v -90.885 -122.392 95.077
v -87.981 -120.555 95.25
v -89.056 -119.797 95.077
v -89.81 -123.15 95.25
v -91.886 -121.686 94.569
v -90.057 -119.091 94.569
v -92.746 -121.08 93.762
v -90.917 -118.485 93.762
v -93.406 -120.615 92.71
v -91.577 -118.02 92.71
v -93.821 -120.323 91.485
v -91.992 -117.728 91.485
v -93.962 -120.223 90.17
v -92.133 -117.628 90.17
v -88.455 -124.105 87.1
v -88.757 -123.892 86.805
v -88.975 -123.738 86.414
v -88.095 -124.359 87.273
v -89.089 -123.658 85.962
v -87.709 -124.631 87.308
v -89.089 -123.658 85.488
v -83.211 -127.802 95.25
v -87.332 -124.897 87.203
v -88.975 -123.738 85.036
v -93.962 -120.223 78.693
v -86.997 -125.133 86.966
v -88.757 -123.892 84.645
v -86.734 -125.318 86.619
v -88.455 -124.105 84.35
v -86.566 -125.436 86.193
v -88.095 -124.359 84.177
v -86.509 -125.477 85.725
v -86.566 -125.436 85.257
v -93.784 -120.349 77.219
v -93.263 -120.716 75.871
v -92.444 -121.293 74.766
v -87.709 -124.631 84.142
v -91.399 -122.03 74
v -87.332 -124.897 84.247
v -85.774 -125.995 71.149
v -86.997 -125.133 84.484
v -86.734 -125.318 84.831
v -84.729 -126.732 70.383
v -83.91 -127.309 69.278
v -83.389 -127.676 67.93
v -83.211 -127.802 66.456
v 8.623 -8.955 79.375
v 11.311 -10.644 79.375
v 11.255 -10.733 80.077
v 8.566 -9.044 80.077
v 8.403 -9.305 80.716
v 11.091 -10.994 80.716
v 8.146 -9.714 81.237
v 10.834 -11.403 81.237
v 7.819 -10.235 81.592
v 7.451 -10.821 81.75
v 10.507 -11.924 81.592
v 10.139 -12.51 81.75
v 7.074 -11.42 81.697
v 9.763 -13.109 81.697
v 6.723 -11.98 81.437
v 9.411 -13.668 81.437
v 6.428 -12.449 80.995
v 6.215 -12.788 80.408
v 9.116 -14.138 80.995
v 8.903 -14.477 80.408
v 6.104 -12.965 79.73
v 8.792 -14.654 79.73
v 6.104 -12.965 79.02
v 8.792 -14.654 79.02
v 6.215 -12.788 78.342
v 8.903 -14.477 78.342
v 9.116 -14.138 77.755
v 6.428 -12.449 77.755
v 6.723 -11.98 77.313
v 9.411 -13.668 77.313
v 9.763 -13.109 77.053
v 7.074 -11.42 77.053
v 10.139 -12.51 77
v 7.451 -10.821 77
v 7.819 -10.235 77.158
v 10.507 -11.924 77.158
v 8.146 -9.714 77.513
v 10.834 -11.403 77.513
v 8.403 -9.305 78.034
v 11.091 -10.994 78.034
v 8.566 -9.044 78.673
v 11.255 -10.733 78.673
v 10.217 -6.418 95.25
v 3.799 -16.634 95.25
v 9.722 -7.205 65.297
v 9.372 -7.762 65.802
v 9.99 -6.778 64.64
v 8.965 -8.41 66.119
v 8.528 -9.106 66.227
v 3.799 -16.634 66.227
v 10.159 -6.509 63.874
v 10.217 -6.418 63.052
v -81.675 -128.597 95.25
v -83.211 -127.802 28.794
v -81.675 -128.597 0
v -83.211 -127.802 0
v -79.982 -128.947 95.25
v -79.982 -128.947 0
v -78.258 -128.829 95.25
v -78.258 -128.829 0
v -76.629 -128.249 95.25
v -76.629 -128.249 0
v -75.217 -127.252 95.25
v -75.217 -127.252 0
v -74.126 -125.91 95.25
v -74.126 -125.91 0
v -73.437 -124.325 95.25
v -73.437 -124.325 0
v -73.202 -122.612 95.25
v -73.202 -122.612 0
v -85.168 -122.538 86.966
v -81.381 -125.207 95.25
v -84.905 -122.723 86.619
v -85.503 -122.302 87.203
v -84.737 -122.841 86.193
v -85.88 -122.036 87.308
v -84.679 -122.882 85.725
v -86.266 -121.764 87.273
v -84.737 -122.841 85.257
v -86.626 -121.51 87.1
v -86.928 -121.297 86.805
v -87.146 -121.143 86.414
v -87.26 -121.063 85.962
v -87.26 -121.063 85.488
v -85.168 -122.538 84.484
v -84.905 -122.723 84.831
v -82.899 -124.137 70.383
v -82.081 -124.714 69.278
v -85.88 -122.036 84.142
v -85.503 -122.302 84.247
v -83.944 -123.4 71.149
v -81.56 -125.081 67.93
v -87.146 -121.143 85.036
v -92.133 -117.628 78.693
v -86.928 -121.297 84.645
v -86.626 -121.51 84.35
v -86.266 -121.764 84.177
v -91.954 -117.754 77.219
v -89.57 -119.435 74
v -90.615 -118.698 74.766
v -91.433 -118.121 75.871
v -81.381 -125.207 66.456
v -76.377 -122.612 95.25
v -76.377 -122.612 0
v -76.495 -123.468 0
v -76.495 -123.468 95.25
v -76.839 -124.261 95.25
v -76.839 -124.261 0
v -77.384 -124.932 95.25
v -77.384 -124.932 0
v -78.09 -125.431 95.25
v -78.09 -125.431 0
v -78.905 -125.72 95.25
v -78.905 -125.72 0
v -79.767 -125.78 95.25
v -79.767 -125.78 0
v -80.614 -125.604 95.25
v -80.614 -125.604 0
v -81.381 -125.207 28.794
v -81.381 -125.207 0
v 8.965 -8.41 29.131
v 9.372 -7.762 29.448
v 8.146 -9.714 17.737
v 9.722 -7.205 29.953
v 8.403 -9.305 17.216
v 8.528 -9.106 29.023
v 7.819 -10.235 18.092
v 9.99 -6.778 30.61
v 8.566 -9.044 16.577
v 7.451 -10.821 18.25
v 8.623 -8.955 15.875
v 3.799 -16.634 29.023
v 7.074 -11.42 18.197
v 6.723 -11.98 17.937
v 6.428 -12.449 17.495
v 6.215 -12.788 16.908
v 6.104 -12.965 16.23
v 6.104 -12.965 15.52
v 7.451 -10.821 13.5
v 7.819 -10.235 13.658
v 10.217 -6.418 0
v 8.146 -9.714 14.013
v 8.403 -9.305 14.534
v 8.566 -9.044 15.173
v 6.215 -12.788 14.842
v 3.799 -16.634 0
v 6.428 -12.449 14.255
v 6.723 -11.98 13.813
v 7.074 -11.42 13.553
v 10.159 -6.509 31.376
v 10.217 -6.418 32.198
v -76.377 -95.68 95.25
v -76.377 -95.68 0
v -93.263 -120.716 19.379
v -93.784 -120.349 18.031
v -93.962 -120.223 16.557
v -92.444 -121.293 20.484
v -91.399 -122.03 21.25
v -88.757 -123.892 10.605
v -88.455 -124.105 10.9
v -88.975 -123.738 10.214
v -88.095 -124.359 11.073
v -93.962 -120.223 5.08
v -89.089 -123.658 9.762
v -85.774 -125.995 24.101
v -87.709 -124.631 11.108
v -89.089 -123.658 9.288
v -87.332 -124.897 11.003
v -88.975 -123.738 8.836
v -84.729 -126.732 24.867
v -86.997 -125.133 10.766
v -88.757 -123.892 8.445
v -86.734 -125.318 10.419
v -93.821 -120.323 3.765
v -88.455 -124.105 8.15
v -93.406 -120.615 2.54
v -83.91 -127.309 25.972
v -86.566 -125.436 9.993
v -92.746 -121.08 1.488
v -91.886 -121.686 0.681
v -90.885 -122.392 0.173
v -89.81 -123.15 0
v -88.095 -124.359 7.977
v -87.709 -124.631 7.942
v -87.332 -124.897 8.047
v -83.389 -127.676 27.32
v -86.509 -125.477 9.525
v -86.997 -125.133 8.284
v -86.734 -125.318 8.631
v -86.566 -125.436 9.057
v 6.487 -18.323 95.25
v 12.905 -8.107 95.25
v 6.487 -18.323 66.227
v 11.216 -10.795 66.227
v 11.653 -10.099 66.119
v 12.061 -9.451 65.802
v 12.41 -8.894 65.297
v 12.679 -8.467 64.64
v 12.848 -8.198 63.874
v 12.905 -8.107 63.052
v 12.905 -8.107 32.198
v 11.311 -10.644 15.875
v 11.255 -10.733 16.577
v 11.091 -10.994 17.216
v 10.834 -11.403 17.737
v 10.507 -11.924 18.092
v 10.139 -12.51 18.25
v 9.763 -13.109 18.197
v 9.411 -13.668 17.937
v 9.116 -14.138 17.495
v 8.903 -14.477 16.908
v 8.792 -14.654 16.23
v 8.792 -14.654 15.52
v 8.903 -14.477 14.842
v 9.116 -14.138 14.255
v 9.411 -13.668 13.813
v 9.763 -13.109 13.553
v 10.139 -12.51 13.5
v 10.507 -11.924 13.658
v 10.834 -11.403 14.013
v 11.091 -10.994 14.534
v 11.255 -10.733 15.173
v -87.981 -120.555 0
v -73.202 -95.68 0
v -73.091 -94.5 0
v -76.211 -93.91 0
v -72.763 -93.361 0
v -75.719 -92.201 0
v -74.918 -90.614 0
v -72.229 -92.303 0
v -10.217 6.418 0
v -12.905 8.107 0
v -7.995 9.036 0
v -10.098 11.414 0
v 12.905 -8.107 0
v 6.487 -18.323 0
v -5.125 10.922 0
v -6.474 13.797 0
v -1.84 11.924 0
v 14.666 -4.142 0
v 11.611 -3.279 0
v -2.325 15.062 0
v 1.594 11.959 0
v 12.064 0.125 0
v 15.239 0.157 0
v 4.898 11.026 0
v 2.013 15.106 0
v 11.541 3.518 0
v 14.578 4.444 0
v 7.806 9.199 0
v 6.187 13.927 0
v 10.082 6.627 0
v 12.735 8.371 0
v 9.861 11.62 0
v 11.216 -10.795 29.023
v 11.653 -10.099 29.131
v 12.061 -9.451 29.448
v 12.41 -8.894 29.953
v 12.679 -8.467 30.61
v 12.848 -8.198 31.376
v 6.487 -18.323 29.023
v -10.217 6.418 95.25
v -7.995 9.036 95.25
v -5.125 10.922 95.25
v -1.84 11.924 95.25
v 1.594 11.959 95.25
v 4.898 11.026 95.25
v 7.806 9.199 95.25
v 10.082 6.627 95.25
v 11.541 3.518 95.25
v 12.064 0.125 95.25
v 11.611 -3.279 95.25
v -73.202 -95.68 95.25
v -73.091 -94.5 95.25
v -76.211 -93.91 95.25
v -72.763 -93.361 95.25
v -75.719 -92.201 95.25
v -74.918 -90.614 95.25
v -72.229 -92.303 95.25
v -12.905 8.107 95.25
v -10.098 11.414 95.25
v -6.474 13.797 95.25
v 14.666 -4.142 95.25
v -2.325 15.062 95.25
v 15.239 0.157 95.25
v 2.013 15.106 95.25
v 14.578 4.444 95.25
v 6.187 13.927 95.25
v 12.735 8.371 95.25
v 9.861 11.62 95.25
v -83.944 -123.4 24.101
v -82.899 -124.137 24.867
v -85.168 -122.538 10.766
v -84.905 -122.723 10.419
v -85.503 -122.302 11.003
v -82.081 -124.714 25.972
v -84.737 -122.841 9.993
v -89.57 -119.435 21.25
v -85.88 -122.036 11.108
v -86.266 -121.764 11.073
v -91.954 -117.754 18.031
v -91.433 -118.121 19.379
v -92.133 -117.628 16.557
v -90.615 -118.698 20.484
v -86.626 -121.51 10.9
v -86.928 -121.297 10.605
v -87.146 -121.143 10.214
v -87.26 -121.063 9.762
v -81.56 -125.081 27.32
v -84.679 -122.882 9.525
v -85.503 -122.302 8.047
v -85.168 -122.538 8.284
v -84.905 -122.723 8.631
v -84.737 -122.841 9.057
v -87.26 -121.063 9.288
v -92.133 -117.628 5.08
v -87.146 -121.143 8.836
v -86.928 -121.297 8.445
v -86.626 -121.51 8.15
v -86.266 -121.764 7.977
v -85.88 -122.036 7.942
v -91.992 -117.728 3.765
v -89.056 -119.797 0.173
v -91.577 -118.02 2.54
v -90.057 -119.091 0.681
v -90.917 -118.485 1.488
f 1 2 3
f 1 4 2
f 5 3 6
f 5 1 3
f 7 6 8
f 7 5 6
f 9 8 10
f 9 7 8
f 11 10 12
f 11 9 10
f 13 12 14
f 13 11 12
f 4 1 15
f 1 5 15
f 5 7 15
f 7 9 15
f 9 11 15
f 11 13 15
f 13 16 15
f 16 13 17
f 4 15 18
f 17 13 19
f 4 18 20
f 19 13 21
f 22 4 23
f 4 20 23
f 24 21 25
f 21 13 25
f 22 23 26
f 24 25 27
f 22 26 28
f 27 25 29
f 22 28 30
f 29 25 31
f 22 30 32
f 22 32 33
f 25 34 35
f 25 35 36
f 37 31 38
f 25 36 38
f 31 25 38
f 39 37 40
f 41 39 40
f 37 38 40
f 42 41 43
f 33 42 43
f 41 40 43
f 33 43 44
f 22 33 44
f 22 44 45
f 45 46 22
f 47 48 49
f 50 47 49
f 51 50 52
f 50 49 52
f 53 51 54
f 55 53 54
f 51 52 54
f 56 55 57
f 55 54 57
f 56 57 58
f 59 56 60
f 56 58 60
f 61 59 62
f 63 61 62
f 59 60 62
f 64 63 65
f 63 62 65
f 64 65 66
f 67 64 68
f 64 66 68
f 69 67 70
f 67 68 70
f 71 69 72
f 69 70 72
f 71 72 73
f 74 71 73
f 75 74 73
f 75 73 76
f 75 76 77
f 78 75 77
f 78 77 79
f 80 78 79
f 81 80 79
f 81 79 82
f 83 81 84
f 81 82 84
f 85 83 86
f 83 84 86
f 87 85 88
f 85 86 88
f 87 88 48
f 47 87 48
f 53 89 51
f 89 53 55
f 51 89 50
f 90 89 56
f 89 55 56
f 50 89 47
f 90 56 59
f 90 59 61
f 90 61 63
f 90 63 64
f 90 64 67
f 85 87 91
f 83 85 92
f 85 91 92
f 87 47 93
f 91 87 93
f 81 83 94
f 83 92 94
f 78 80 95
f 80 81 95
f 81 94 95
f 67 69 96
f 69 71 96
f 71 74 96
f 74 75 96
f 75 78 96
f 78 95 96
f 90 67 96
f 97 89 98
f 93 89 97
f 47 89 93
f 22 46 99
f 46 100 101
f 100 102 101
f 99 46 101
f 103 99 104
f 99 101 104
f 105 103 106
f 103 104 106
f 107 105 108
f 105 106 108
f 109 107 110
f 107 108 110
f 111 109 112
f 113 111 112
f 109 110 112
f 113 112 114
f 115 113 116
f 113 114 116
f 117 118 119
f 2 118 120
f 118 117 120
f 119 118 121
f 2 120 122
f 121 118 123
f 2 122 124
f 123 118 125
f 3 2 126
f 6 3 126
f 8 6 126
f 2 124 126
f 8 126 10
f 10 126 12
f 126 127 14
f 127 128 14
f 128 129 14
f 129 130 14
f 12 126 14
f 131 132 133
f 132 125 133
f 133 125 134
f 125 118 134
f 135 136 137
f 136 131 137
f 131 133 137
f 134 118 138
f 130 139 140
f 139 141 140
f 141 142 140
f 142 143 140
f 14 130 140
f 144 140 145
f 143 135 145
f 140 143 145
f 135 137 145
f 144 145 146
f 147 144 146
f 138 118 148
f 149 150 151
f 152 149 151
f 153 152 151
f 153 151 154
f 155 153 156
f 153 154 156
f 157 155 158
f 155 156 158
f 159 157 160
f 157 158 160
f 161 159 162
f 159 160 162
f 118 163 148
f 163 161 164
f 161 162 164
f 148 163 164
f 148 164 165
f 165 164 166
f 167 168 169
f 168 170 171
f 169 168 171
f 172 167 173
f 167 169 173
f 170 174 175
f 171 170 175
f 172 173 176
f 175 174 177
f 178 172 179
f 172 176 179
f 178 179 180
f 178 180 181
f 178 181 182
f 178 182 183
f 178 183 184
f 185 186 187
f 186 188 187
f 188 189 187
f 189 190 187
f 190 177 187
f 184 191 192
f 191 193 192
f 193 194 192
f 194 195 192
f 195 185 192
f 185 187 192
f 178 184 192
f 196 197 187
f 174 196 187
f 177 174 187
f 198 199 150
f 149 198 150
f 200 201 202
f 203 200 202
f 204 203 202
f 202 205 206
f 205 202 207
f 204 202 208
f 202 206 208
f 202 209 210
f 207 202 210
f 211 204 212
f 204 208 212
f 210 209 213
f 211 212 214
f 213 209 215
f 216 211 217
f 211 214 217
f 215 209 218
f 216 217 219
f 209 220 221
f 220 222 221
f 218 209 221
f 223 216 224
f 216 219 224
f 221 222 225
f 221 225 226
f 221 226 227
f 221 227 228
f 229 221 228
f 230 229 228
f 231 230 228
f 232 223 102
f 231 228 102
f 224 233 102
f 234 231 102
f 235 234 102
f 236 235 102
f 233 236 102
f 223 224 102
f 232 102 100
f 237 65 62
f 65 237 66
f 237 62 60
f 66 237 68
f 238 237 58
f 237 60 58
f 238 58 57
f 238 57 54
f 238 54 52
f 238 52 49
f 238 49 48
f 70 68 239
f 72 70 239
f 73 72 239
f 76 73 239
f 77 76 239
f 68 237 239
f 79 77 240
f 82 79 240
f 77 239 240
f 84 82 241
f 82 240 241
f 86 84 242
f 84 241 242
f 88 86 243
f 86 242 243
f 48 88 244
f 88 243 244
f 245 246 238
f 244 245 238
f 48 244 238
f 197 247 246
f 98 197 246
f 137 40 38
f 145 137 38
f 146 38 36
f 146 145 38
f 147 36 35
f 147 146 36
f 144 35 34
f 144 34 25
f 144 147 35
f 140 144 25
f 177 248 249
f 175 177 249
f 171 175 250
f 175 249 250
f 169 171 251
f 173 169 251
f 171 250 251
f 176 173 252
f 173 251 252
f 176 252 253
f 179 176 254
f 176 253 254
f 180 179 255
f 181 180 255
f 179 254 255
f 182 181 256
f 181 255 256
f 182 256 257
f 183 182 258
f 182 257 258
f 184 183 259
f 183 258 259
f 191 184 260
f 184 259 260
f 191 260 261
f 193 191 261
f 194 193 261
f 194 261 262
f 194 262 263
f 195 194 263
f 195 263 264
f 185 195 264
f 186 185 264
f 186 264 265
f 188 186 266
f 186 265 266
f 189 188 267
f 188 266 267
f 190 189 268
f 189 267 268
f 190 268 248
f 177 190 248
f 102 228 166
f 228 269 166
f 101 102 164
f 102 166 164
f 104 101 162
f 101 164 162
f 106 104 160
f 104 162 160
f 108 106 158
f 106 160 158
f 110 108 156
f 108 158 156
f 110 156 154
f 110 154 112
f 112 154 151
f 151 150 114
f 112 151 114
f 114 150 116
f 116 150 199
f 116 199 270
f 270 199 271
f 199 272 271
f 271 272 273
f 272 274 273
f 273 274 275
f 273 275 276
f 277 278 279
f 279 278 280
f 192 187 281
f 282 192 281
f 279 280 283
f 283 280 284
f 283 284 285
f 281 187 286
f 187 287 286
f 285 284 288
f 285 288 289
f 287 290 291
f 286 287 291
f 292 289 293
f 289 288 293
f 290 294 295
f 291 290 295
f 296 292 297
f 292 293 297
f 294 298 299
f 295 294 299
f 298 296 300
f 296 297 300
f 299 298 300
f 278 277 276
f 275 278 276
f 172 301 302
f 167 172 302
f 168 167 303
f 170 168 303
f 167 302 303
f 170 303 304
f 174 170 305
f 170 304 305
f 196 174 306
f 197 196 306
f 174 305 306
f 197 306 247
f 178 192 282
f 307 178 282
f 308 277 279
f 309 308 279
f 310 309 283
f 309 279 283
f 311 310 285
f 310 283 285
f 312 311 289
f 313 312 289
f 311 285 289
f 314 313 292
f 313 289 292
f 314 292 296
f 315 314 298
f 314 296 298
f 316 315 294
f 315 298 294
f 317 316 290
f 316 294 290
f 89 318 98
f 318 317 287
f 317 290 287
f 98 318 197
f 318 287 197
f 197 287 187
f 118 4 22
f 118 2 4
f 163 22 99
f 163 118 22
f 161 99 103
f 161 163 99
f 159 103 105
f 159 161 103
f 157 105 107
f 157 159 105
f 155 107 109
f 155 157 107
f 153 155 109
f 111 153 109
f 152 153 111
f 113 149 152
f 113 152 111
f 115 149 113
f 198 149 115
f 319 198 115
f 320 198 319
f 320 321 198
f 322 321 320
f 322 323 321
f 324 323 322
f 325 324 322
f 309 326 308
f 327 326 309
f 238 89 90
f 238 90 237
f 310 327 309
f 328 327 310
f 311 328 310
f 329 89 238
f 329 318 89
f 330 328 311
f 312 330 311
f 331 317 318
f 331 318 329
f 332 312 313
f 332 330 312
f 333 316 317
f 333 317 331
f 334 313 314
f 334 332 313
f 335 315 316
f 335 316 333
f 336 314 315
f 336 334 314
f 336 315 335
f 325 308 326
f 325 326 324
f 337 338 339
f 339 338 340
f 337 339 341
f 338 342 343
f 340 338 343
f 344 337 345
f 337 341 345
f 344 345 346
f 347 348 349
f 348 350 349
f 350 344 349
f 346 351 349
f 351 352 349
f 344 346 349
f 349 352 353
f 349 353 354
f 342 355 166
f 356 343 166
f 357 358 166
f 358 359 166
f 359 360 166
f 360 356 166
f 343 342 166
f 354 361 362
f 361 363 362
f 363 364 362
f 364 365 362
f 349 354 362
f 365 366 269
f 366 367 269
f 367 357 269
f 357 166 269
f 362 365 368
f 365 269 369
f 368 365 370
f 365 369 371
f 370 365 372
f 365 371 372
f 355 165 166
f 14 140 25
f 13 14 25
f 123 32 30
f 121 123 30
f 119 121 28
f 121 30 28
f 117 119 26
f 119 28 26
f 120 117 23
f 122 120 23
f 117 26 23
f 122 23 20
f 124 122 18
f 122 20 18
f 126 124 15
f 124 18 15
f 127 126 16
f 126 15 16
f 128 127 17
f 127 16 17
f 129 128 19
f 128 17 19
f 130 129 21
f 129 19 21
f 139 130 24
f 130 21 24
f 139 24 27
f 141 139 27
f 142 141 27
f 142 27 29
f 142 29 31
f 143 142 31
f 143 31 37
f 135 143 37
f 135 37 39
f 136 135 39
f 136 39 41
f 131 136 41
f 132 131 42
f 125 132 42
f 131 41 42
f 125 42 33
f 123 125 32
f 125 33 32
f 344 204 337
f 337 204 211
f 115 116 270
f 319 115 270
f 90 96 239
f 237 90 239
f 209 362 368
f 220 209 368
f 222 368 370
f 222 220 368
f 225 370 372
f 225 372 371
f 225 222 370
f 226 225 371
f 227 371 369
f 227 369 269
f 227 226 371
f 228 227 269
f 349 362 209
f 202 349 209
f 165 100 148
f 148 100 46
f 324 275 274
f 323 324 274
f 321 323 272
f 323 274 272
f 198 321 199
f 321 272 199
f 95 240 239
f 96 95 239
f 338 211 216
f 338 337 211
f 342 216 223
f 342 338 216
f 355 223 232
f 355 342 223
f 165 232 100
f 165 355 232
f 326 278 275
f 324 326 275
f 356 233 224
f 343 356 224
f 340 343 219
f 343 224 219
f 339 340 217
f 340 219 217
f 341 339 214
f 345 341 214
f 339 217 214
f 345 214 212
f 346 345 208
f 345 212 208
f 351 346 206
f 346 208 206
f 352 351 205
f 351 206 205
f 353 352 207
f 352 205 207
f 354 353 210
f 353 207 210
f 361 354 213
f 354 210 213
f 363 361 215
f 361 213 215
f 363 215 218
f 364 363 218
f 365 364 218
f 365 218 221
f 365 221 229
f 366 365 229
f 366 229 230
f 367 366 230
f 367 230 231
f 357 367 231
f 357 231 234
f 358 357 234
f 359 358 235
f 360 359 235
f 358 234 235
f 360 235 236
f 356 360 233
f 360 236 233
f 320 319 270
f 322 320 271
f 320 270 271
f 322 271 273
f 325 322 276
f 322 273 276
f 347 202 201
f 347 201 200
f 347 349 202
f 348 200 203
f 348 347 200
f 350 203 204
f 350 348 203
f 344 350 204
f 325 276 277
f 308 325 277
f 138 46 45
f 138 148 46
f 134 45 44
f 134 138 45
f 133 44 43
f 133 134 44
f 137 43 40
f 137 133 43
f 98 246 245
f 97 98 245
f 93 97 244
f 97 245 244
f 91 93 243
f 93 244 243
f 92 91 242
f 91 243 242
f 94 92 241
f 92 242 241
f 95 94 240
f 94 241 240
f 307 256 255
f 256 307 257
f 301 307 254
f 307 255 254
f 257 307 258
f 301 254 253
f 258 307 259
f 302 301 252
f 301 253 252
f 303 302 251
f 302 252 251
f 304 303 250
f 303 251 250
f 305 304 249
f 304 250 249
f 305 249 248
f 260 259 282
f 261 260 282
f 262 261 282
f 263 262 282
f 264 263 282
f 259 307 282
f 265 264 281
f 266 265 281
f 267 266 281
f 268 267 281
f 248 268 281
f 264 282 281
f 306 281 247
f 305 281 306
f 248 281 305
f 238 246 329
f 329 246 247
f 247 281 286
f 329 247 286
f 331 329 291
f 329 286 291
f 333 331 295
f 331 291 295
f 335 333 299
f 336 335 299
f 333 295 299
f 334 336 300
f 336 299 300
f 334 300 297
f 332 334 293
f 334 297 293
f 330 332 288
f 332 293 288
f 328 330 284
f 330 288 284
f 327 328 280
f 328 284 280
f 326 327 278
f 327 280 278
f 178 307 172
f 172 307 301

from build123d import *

# Parameters (mm, degrees)
F1_DEPTH = 95.25
F2_R     = 1.5875
F3_DEPTH = 3.175
F4_DEPTH = 3.175
F5_R     = 5.08
F6_R     = 2.38125
F7_DEPTH = 3.175
F9_DEPTH = 12.7


with BuildPart() as f1:
    # F0 (on Top) → F1 (new body)
    with BuildSketch(Plane.XY):
        with BuildLine():
            Line((-92.1331368885, -117.6278676055), (-93.9624351915, -120.2229191885))
            Line((-93.9624351915, -120.2229191885), (-83.2106191336, -127.802066747))
            ThreePointArc((-83.2106191336, -127.802066747), (-76.6288041341, -128.2490988663), (-73.2020225275, -122.611963581))
            Line((-73.2020225275, -122.611963581), (-73.2020225275, -95.6804940123))
            ThreePointArc((-73.2020225275, -95.6804940123), (-72.9539595945, -93.922977574), (-72.2291519666, -92.3027759964))
            Line((-72.2291519666, -92.3027759964), (-10.2165459343, 6.4176642302))
            ThreePointArc((-10.2165459343, 6.4176642302), (6.4176642302, 10.2165459343), (10.2165459343, -6.4176642302))
            Line((10.2165459343, -6.4176642302), (3.7988817041, -16.6342101646))
            Line((3.7988817041, -16.6342101646), (6.4874464236, -18.3230691725))
            Line((6.4874464236, -18.3230691725), (12.9051106539, -8.1065232382))
            ThreePointArc((12.9051106539, -8.1065232382), (8.1065232382, 12.9051106539), (-12.9051106539, 8.1065232382))
            Line((-12.9051106539, 8.1065232382), (-74.9177166862, -90.6139169884))
            ThreePointArc((-74.9177166862, -90.6139169884), (-76.004928128, -93.0442193549), (-76.3770225275, -95.6804940123))
            Line((-76.3770225275, -95.6804940123), (-76.3770225275, -122.611963581))
            ThreePointArc((-76.3770225275, -122.611963581), (-78.0904133308, -125.4305312236), (-81.3813208306, -125.207015164))
            Line((-81.3813208306, -125.207015164), (-92.1331368885, -117.6278676055))
        make_face()
    extrude(amount=F1_DEPTH)

    # F2 (on face) → F3 (cut, through all)
    with BuildSketch(Plane(origin=(-87.8063185468, -124.562475984, 0), x_dir=(0.8173390813, -0.5761569458, 0), z_dir=(-0.5761569458, -0.8173390813, 0))):
        with Locations((0, 85.725)):
            Circle(F2_R)
        with Locations((0, 9.525)):
            Circle(F2_R)
    extrude(amount=-F3_DEPTH, mode=Mode.SUBTRACT)

    # F2 (on face) → F4 (cut, through all)
    with BuildSketch(Plane(origin=(-87.8063185468, -124.562475984, 0), x_dir=(0.8173390813, -0.5761569458, 0), z_dir=(-0.5761569458, -0.8173390813, 0))):
        Polygon((5.6227574559, 69.85), (-7.5319005121, 75.2988377387), (-7.5319005121, 19.9511622613), (5.6227574559, 25.4), align=None)
    extrude(amount=-F4_DEPTH, mode=Mode.SUBTRACT)

    # F5
    f5_edges = [f1.edges().sort_by_distance(p)[0] for p in [
        (-93.047786, -118.925393, 95.25),
        (-93.047786, -118.925393, 75.298838),
        (-82.29597, -126.504541, 69.85),
        (-82.29597, -126.504541, 25.4),
        (-93.047786, -118.925393, 19.951162),
        (-93.047786, -118.925393, 0),
    ]]
    fillet(f5_edges, radius=F5_R)

    # F6 (on face) → F7 (cut, through all)
    with BuildSketch(Plane(origin=(12.9051106539, -8.1065232382, 0), x_dir=(0.531924097, 0.8467920377, 0), z_dir=(0.8467920377, -0.531924097, 0))):
        with Locations((-5.377555266, 79.375)):
            Circle(F6_R)
        with Locations((-5.377555266, 15.875)):
            Circle(F6_R)
    extrude(amount=-F7_DEPTH, mode=Mode.SUBTRACT)

    # F8 (on face) → F9 (cut)
    with BuildSketch(Plane(origin=(12.9051106539, -8.1065232382, 0), x_dir=(0.531924097, 0.8467920377, 0), z_dir=(0.8467920377, -0.531924097, 0))):
        with BuildLine():
            Line((-3.175, 66.2270688534), (-12.065, 66.2270688534))
            Line((-12.065, 66.2270688534), (-12.065, 29.0229311466))
            Line((-12.065, 29.0229311466), (-3.175, 29.0229311466))
            ThreePointArc((-3.175, 29.0229311466), (-0.9299359697, 29.9528671164), (0, 32.1979311466))
            Line((0, 32.1979311466), (0, 63.0520688534))
            ThreePointArc((0, 63.0520688534), (-0.9299359697, 65.2971328836), (-3.175, 66.2270688534))
        make_face()
    extrude(amount=-F9_DEPTH, mode=Mode.SUBTRACT)


solid = f1.part
